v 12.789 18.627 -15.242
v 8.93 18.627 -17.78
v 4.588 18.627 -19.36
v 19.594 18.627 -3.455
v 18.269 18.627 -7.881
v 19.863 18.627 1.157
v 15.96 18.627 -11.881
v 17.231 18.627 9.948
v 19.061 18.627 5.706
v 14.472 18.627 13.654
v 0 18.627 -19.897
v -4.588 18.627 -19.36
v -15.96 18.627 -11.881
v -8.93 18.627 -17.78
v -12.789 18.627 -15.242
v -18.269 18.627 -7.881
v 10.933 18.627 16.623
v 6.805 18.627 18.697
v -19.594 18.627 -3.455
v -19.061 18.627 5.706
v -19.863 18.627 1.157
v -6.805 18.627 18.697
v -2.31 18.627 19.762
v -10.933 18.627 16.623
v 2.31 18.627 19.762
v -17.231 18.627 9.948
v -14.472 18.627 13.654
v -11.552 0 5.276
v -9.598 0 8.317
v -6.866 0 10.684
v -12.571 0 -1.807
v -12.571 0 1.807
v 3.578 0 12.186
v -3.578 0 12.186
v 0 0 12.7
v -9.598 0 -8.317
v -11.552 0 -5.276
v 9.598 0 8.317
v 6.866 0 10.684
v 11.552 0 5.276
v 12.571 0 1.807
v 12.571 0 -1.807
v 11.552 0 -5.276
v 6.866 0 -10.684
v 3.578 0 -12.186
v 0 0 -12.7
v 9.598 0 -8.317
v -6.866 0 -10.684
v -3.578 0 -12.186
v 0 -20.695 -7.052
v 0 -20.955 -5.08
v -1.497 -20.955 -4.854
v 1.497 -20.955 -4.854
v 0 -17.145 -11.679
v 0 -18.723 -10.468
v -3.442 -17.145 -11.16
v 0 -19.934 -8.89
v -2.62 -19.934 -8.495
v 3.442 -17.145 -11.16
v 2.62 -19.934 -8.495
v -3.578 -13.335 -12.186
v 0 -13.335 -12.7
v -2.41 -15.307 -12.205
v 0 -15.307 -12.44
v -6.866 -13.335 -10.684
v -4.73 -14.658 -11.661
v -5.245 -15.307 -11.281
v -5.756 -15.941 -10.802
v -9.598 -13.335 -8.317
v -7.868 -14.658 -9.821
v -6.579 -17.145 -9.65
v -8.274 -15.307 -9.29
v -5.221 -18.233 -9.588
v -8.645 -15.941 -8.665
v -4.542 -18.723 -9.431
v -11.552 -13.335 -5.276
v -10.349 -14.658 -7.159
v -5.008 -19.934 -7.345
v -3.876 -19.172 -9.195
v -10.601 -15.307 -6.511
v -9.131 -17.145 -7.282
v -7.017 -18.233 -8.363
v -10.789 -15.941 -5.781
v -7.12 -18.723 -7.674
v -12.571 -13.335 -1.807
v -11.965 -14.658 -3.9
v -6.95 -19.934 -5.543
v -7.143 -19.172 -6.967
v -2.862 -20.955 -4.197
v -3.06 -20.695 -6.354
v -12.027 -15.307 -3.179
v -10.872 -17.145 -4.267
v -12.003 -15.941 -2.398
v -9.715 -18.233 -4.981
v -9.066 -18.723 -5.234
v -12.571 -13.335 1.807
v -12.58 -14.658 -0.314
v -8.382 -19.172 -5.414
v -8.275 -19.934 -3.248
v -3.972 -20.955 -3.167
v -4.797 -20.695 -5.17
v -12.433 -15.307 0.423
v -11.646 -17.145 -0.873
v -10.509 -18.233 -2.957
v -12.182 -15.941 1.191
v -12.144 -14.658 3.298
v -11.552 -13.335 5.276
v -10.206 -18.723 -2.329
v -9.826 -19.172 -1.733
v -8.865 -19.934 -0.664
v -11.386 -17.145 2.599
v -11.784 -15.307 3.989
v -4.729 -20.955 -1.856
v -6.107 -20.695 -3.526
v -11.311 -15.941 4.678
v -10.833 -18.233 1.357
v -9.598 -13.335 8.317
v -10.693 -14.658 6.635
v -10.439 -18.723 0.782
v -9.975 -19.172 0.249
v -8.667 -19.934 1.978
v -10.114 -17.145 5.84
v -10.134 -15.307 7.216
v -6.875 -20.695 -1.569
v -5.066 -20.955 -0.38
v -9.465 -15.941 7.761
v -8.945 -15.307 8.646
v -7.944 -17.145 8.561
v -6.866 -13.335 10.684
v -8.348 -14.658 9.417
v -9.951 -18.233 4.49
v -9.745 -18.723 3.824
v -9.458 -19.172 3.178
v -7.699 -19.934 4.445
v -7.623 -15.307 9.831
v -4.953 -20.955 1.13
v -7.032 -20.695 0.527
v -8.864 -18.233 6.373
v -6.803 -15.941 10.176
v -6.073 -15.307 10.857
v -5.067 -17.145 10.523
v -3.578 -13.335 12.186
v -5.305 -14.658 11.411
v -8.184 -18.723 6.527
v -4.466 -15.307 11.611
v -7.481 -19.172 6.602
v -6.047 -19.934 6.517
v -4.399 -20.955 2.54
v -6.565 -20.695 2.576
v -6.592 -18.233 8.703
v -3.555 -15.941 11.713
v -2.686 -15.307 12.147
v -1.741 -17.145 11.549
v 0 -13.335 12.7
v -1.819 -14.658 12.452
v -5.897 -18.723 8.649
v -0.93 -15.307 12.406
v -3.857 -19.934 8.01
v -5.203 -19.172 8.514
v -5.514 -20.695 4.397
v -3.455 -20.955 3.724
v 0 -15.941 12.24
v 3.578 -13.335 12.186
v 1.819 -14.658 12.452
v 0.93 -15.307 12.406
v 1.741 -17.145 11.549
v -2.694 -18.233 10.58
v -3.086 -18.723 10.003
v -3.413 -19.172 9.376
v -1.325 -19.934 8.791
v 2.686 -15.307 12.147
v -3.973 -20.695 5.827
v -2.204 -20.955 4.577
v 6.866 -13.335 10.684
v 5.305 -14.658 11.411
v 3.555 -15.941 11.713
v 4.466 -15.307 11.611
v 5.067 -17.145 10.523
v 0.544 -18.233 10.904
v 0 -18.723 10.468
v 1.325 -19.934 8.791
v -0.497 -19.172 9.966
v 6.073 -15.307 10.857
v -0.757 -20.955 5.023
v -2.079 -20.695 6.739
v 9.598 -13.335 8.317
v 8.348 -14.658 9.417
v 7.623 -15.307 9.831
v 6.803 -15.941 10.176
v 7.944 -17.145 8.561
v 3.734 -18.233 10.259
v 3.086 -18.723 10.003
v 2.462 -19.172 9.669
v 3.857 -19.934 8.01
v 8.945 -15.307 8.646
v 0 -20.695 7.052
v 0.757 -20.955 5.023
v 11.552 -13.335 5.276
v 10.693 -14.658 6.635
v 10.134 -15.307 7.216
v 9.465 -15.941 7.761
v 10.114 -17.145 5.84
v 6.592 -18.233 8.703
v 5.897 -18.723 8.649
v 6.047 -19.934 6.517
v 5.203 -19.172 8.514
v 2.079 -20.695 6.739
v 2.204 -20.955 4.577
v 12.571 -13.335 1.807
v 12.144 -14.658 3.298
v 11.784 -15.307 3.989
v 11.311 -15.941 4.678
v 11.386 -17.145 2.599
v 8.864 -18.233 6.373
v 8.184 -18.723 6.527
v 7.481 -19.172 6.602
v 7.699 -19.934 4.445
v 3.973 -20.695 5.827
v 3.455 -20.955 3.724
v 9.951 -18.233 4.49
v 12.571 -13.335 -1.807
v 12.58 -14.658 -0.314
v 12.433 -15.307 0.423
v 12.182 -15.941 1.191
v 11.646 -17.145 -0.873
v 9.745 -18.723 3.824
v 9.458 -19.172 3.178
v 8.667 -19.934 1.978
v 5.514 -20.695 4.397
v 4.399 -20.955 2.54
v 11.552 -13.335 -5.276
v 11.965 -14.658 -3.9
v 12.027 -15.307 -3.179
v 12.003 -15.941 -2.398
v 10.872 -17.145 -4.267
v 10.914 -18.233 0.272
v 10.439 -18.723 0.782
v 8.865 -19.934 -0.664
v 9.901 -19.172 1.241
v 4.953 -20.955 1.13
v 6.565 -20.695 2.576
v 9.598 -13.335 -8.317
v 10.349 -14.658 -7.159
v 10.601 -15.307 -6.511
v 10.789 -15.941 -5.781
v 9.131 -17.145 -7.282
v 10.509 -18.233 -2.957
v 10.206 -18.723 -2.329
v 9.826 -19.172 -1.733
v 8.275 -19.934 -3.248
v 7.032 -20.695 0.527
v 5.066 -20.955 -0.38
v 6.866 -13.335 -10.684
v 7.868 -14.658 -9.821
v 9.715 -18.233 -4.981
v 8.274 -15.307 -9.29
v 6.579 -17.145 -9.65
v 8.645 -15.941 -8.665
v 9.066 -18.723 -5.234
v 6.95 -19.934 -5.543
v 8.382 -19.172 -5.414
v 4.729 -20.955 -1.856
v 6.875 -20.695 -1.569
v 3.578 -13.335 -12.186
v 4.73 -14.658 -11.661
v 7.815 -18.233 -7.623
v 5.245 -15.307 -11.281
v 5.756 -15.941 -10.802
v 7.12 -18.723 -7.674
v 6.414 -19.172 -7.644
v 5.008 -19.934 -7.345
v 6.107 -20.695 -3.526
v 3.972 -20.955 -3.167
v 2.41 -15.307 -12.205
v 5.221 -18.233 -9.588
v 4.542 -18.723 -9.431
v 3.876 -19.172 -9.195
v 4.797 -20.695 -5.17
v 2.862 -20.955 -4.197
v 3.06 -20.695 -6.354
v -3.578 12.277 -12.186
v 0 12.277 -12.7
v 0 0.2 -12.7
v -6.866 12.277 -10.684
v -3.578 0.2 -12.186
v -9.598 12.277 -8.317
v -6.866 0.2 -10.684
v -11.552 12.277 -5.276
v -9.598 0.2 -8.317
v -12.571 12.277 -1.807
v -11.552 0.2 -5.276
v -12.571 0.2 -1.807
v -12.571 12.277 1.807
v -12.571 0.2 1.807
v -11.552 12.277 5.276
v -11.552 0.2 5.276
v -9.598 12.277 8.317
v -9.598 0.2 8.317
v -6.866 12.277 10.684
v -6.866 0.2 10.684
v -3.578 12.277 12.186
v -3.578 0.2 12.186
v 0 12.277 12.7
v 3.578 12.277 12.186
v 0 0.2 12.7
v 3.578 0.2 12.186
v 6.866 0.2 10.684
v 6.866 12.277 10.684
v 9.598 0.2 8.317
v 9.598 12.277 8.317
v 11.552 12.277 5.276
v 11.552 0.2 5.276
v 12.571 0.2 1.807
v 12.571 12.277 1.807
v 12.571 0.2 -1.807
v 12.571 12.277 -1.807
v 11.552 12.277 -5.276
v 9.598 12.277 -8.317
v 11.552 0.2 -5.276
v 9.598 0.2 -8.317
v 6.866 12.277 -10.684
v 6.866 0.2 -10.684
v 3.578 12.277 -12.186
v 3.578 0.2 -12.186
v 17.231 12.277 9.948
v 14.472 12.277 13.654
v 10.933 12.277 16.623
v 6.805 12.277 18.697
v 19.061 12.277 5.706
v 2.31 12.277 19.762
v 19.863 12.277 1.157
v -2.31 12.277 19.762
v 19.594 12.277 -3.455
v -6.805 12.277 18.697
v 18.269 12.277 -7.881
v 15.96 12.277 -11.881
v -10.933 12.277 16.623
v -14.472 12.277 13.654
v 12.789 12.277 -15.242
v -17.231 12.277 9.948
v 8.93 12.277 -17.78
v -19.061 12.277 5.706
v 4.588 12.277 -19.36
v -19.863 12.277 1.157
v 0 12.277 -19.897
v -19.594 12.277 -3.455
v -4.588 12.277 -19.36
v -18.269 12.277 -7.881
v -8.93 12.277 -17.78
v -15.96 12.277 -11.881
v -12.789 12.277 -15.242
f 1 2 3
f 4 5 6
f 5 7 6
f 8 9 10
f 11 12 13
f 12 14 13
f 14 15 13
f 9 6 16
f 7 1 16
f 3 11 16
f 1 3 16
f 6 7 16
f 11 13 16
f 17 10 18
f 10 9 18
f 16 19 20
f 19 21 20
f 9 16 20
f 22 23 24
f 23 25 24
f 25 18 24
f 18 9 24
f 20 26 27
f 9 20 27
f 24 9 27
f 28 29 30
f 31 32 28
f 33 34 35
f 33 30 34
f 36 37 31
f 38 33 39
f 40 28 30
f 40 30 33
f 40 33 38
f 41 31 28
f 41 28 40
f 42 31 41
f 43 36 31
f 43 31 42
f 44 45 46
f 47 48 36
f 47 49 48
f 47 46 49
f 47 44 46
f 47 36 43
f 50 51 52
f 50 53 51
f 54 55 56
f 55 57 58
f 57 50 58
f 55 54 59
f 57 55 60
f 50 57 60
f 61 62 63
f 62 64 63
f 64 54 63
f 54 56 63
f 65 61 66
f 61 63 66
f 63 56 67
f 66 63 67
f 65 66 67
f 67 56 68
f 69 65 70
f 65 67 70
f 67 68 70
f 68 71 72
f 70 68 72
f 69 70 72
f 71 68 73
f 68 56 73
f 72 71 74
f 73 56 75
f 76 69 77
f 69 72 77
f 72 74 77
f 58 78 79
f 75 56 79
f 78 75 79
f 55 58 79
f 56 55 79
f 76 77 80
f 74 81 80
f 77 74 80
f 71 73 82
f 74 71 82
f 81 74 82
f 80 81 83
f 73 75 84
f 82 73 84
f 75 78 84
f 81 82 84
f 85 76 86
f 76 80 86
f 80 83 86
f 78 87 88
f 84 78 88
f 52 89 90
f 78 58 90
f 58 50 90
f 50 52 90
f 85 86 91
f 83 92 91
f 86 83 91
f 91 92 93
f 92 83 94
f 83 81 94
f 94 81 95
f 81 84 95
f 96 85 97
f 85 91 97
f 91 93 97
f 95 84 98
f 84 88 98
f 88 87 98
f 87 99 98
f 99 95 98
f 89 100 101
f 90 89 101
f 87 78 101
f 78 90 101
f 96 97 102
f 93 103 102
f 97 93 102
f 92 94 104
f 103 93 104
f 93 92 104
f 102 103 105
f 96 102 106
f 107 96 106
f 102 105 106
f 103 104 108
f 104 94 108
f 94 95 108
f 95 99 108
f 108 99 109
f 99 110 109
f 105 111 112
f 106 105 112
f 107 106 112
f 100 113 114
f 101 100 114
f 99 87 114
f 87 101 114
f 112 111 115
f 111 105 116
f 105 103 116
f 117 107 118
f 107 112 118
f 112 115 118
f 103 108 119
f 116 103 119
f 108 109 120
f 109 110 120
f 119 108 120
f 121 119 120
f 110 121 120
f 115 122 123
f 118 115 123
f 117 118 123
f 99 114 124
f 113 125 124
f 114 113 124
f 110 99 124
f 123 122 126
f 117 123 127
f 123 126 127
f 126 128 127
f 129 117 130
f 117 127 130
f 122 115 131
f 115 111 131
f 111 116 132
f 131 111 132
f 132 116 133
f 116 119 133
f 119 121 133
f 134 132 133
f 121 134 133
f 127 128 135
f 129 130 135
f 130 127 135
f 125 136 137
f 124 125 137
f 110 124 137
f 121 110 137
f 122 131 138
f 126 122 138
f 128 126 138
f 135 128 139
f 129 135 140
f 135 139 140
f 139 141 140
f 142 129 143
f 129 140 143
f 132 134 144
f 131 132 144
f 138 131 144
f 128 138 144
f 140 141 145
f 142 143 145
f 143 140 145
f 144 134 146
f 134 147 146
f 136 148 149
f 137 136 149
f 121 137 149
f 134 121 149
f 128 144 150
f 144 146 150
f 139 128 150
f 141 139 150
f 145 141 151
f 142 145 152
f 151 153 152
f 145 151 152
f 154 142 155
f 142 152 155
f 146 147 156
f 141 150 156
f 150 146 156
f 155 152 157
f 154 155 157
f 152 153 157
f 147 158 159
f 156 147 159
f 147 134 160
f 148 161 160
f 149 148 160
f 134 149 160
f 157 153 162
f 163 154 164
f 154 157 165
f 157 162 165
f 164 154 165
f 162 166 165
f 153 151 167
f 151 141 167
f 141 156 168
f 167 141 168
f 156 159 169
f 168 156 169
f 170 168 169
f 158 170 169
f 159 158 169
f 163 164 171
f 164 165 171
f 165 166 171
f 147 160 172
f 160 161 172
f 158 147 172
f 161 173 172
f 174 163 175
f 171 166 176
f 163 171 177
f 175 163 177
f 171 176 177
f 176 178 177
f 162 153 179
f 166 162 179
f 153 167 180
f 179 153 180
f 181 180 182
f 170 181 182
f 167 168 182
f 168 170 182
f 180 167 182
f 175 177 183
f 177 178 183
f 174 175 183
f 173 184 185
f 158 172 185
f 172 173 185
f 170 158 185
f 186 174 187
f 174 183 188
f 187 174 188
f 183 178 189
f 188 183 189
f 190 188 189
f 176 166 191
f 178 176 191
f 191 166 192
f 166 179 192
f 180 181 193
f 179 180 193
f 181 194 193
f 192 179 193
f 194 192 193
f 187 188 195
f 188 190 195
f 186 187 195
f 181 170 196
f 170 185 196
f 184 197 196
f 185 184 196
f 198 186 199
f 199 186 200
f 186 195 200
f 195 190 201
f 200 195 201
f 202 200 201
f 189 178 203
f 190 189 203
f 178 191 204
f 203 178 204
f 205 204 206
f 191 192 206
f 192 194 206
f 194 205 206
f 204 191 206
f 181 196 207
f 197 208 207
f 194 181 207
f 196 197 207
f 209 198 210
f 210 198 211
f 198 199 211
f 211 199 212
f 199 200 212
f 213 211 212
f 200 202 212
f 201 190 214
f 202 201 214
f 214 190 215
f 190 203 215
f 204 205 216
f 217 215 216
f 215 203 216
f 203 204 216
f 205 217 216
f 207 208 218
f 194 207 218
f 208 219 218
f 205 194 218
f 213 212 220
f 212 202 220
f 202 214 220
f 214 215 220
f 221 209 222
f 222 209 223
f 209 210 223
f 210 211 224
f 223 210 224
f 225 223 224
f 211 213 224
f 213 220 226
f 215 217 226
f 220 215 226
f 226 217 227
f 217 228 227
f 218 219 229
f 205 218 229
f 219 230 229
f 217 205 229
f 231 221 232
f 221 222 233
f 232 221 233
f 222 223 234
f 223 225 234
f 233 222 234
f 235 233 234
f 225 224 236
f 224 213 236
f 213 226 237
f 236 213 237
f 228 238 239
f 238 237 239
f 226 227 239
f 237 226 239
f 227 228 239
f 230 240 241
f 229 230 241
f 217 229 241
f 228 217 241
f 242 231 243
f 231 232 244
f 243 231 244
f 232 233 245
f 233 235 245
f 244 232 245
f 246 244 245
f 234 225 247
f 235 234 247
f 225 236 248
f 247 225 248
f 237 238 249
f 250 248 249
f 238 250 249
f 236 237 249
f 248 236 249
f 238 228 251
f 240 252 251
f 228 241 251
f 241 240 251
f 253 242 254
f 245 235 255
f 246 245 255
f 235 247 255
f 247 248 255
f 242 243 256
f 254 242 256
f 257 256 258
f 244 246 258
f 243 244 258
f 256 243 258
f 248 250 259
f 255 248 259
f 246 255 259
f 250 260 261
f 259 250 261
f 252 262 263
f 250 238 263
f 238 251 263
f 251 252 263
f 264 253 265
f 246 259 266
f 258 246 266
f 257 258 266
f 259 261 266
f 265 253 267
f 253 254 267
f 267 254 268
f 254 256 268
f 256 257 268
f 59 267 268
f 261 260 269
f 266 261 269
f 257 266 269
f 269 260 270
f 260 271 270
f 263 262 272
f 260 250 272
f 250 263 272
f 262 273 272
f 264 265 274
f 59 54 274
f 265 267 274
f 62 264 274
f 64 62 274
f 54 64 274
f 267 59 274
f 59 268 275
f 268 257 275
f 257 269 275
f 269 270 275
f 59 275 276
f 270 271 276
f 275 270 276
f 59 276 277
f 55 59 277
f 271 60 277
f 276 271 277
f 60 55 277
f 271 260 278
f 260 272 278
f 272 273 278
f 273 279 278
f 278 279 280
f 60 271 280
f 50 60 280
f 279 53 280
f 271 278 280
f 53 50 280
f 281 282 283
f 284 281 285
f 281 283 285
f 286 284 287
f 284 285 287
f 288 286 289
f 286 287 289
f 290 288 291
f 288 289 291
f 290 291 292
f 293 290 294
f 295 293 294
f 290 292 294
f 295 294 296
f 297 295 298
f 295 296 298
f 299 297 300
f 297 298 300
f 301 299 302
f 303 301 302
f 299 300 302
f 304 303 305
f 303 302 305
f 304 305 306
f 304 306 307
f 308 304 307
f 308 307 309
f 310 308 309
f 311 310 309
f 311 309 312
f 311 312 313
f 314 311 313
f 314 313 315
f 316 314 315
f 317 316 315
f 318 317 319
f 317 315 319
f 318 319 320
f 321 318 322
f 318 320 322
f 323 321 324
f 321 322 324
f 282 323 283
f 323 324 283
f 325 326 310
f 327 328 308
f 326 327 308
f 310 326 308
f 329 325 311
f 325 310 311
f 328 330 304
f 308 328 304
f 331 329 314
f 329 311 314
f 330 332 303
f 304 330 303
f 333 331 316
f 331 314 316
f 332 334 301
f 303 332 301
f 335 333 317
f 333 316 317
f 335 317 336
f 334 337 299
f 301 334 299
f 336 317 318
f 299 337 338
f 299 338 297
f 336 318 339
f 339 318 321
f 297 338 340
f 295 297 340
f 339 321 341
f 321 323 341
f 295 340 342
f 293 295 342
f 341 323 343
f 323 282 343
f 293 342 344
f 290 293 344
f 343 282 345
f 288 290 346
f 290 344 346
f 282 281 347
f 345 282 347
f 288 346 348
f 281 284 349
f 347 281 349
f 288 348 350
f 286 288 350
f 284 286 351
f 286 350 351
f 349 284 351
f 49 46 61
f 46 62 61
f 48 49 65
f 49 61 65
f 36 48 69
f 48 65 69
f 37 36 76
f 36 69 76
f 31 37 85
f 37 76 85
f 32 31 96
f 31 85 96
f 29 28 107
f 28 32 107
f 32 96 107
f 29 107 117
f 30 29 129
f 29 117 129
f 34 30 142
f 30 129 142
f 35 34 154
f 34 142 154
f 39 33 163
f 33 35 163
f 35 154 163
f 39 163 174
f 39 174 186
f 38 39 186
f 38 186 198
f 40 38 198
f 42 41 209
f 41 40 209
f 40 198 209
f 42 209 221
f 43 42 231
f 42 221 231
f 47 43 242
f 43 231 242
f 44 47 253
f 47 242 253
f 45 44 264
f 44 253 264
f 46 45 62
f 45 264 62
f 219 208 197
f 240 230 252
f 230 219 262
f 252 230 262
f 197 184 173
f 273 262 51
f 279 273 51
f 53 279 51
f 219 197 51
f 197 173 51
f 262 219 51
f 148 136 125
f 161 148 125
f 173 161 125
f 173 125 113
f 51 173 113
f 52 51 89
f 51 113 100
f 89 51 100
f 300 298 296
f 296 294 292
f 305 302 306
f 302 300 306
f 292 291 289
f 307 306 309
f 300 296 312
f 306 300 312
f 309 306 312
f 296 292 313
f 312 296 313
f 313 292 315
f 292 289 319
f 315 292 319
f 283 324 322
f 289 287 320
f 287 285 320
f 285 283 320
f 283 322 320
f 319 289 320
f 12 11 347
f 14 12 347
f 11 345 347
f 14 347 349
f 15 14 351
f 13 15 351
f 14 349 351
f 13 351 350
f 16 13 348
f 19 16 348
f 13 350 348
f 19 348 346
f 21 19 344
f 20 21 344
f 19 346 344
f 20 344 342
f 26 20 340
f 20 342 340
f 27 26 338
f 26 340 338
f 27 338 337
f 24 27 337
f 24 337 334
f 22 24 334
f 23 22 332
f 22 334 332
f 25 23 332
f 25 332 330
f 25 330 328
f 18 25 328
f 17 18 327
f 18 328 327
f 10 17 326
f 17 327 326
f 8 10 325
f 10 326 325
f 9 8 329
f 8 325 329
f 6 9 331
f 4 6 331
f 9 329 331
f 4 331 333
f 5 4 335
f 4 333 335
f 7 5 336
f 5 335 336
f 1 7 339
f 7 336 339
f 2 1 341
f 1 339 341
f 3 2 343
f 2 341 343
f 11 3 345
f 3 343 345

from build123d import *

# Parameters (mm, degrees)
CUT_EXTRUDE1_DEPTH      = 36.083710153
CUT_EXTRUDE1_DEPTH_BACK = 36.083710153
SKETCH2_W               = 72.831256038
SKETCH2_H               = 0.2


with BuildPart() as part:
    # Sketch1 → Revolve1 (revolve)
    with BuildSketch(Plane.XY, mode=Mode.PRIVATE) as revolve1_sk:
        with BuildLine():
            Line((0, 18.626666667), (19.896666667, 18.626666667))
            Line((19.896666667, 18.626666667), (19.896666667, 12.276666667))
            Line((19.896666667, 12.276666667), (12.7, 12.276666667))
            Line((12.7, 12.276666667), (12.7, -13.335))
            ThreePointArc((12.7, -13.335), (10.468153673, -18.723153673), (5.08, -20.955))
            Line((5.08, -20.955), (0, -20.955))
            Line((0, -20.955), (0, 18.626666667))
        make_face()
    revolve(revolve1_sk.sketch.rotate(Axis((0, -20.955, 0), (0, 1, 0)), 90), axis=Axis((0, -20.955, 0), (0, 1, 0)))

    # Sketch2 → Cut-Extrude1 (cut, two sides: drawn at the far end of the back side and taken through both)
    with BuildSketch(Plane.XY.offset(-CUT_EXTRUDE1_DEPTH_BACK)):
        with Locations((0, 0.1)):
            Rectangle(SKETCH2_W, SKETCH2_H)
    extrude(amount=CUT_EXTRUDE1_DEPTH + CUT_EXTRUDE1_DEPTH_BACK, mode=Mode.SUBTRACT)


with BuildPart() as cut_extrude1_piece_1:
    # of the separate pieces the step leaves, piece 1, a body of its own (cut_extrude1_pieces)
    add(part.part.solids().sort_by_distance((0, 12.276666667, -12.7))[0])


with BuildPart() as cut_extrude1_piece_2:
    # of the separate pieces the step leaves, piece 2, a body of its own (cut_extrude1_pieces)
    add(part.part.solids().sort_by_distance((0, -20.955, -5.08))[0])


solid = Compound([cut_extrude1_piece_1.part, cut_extrude1_piece_2.part])
